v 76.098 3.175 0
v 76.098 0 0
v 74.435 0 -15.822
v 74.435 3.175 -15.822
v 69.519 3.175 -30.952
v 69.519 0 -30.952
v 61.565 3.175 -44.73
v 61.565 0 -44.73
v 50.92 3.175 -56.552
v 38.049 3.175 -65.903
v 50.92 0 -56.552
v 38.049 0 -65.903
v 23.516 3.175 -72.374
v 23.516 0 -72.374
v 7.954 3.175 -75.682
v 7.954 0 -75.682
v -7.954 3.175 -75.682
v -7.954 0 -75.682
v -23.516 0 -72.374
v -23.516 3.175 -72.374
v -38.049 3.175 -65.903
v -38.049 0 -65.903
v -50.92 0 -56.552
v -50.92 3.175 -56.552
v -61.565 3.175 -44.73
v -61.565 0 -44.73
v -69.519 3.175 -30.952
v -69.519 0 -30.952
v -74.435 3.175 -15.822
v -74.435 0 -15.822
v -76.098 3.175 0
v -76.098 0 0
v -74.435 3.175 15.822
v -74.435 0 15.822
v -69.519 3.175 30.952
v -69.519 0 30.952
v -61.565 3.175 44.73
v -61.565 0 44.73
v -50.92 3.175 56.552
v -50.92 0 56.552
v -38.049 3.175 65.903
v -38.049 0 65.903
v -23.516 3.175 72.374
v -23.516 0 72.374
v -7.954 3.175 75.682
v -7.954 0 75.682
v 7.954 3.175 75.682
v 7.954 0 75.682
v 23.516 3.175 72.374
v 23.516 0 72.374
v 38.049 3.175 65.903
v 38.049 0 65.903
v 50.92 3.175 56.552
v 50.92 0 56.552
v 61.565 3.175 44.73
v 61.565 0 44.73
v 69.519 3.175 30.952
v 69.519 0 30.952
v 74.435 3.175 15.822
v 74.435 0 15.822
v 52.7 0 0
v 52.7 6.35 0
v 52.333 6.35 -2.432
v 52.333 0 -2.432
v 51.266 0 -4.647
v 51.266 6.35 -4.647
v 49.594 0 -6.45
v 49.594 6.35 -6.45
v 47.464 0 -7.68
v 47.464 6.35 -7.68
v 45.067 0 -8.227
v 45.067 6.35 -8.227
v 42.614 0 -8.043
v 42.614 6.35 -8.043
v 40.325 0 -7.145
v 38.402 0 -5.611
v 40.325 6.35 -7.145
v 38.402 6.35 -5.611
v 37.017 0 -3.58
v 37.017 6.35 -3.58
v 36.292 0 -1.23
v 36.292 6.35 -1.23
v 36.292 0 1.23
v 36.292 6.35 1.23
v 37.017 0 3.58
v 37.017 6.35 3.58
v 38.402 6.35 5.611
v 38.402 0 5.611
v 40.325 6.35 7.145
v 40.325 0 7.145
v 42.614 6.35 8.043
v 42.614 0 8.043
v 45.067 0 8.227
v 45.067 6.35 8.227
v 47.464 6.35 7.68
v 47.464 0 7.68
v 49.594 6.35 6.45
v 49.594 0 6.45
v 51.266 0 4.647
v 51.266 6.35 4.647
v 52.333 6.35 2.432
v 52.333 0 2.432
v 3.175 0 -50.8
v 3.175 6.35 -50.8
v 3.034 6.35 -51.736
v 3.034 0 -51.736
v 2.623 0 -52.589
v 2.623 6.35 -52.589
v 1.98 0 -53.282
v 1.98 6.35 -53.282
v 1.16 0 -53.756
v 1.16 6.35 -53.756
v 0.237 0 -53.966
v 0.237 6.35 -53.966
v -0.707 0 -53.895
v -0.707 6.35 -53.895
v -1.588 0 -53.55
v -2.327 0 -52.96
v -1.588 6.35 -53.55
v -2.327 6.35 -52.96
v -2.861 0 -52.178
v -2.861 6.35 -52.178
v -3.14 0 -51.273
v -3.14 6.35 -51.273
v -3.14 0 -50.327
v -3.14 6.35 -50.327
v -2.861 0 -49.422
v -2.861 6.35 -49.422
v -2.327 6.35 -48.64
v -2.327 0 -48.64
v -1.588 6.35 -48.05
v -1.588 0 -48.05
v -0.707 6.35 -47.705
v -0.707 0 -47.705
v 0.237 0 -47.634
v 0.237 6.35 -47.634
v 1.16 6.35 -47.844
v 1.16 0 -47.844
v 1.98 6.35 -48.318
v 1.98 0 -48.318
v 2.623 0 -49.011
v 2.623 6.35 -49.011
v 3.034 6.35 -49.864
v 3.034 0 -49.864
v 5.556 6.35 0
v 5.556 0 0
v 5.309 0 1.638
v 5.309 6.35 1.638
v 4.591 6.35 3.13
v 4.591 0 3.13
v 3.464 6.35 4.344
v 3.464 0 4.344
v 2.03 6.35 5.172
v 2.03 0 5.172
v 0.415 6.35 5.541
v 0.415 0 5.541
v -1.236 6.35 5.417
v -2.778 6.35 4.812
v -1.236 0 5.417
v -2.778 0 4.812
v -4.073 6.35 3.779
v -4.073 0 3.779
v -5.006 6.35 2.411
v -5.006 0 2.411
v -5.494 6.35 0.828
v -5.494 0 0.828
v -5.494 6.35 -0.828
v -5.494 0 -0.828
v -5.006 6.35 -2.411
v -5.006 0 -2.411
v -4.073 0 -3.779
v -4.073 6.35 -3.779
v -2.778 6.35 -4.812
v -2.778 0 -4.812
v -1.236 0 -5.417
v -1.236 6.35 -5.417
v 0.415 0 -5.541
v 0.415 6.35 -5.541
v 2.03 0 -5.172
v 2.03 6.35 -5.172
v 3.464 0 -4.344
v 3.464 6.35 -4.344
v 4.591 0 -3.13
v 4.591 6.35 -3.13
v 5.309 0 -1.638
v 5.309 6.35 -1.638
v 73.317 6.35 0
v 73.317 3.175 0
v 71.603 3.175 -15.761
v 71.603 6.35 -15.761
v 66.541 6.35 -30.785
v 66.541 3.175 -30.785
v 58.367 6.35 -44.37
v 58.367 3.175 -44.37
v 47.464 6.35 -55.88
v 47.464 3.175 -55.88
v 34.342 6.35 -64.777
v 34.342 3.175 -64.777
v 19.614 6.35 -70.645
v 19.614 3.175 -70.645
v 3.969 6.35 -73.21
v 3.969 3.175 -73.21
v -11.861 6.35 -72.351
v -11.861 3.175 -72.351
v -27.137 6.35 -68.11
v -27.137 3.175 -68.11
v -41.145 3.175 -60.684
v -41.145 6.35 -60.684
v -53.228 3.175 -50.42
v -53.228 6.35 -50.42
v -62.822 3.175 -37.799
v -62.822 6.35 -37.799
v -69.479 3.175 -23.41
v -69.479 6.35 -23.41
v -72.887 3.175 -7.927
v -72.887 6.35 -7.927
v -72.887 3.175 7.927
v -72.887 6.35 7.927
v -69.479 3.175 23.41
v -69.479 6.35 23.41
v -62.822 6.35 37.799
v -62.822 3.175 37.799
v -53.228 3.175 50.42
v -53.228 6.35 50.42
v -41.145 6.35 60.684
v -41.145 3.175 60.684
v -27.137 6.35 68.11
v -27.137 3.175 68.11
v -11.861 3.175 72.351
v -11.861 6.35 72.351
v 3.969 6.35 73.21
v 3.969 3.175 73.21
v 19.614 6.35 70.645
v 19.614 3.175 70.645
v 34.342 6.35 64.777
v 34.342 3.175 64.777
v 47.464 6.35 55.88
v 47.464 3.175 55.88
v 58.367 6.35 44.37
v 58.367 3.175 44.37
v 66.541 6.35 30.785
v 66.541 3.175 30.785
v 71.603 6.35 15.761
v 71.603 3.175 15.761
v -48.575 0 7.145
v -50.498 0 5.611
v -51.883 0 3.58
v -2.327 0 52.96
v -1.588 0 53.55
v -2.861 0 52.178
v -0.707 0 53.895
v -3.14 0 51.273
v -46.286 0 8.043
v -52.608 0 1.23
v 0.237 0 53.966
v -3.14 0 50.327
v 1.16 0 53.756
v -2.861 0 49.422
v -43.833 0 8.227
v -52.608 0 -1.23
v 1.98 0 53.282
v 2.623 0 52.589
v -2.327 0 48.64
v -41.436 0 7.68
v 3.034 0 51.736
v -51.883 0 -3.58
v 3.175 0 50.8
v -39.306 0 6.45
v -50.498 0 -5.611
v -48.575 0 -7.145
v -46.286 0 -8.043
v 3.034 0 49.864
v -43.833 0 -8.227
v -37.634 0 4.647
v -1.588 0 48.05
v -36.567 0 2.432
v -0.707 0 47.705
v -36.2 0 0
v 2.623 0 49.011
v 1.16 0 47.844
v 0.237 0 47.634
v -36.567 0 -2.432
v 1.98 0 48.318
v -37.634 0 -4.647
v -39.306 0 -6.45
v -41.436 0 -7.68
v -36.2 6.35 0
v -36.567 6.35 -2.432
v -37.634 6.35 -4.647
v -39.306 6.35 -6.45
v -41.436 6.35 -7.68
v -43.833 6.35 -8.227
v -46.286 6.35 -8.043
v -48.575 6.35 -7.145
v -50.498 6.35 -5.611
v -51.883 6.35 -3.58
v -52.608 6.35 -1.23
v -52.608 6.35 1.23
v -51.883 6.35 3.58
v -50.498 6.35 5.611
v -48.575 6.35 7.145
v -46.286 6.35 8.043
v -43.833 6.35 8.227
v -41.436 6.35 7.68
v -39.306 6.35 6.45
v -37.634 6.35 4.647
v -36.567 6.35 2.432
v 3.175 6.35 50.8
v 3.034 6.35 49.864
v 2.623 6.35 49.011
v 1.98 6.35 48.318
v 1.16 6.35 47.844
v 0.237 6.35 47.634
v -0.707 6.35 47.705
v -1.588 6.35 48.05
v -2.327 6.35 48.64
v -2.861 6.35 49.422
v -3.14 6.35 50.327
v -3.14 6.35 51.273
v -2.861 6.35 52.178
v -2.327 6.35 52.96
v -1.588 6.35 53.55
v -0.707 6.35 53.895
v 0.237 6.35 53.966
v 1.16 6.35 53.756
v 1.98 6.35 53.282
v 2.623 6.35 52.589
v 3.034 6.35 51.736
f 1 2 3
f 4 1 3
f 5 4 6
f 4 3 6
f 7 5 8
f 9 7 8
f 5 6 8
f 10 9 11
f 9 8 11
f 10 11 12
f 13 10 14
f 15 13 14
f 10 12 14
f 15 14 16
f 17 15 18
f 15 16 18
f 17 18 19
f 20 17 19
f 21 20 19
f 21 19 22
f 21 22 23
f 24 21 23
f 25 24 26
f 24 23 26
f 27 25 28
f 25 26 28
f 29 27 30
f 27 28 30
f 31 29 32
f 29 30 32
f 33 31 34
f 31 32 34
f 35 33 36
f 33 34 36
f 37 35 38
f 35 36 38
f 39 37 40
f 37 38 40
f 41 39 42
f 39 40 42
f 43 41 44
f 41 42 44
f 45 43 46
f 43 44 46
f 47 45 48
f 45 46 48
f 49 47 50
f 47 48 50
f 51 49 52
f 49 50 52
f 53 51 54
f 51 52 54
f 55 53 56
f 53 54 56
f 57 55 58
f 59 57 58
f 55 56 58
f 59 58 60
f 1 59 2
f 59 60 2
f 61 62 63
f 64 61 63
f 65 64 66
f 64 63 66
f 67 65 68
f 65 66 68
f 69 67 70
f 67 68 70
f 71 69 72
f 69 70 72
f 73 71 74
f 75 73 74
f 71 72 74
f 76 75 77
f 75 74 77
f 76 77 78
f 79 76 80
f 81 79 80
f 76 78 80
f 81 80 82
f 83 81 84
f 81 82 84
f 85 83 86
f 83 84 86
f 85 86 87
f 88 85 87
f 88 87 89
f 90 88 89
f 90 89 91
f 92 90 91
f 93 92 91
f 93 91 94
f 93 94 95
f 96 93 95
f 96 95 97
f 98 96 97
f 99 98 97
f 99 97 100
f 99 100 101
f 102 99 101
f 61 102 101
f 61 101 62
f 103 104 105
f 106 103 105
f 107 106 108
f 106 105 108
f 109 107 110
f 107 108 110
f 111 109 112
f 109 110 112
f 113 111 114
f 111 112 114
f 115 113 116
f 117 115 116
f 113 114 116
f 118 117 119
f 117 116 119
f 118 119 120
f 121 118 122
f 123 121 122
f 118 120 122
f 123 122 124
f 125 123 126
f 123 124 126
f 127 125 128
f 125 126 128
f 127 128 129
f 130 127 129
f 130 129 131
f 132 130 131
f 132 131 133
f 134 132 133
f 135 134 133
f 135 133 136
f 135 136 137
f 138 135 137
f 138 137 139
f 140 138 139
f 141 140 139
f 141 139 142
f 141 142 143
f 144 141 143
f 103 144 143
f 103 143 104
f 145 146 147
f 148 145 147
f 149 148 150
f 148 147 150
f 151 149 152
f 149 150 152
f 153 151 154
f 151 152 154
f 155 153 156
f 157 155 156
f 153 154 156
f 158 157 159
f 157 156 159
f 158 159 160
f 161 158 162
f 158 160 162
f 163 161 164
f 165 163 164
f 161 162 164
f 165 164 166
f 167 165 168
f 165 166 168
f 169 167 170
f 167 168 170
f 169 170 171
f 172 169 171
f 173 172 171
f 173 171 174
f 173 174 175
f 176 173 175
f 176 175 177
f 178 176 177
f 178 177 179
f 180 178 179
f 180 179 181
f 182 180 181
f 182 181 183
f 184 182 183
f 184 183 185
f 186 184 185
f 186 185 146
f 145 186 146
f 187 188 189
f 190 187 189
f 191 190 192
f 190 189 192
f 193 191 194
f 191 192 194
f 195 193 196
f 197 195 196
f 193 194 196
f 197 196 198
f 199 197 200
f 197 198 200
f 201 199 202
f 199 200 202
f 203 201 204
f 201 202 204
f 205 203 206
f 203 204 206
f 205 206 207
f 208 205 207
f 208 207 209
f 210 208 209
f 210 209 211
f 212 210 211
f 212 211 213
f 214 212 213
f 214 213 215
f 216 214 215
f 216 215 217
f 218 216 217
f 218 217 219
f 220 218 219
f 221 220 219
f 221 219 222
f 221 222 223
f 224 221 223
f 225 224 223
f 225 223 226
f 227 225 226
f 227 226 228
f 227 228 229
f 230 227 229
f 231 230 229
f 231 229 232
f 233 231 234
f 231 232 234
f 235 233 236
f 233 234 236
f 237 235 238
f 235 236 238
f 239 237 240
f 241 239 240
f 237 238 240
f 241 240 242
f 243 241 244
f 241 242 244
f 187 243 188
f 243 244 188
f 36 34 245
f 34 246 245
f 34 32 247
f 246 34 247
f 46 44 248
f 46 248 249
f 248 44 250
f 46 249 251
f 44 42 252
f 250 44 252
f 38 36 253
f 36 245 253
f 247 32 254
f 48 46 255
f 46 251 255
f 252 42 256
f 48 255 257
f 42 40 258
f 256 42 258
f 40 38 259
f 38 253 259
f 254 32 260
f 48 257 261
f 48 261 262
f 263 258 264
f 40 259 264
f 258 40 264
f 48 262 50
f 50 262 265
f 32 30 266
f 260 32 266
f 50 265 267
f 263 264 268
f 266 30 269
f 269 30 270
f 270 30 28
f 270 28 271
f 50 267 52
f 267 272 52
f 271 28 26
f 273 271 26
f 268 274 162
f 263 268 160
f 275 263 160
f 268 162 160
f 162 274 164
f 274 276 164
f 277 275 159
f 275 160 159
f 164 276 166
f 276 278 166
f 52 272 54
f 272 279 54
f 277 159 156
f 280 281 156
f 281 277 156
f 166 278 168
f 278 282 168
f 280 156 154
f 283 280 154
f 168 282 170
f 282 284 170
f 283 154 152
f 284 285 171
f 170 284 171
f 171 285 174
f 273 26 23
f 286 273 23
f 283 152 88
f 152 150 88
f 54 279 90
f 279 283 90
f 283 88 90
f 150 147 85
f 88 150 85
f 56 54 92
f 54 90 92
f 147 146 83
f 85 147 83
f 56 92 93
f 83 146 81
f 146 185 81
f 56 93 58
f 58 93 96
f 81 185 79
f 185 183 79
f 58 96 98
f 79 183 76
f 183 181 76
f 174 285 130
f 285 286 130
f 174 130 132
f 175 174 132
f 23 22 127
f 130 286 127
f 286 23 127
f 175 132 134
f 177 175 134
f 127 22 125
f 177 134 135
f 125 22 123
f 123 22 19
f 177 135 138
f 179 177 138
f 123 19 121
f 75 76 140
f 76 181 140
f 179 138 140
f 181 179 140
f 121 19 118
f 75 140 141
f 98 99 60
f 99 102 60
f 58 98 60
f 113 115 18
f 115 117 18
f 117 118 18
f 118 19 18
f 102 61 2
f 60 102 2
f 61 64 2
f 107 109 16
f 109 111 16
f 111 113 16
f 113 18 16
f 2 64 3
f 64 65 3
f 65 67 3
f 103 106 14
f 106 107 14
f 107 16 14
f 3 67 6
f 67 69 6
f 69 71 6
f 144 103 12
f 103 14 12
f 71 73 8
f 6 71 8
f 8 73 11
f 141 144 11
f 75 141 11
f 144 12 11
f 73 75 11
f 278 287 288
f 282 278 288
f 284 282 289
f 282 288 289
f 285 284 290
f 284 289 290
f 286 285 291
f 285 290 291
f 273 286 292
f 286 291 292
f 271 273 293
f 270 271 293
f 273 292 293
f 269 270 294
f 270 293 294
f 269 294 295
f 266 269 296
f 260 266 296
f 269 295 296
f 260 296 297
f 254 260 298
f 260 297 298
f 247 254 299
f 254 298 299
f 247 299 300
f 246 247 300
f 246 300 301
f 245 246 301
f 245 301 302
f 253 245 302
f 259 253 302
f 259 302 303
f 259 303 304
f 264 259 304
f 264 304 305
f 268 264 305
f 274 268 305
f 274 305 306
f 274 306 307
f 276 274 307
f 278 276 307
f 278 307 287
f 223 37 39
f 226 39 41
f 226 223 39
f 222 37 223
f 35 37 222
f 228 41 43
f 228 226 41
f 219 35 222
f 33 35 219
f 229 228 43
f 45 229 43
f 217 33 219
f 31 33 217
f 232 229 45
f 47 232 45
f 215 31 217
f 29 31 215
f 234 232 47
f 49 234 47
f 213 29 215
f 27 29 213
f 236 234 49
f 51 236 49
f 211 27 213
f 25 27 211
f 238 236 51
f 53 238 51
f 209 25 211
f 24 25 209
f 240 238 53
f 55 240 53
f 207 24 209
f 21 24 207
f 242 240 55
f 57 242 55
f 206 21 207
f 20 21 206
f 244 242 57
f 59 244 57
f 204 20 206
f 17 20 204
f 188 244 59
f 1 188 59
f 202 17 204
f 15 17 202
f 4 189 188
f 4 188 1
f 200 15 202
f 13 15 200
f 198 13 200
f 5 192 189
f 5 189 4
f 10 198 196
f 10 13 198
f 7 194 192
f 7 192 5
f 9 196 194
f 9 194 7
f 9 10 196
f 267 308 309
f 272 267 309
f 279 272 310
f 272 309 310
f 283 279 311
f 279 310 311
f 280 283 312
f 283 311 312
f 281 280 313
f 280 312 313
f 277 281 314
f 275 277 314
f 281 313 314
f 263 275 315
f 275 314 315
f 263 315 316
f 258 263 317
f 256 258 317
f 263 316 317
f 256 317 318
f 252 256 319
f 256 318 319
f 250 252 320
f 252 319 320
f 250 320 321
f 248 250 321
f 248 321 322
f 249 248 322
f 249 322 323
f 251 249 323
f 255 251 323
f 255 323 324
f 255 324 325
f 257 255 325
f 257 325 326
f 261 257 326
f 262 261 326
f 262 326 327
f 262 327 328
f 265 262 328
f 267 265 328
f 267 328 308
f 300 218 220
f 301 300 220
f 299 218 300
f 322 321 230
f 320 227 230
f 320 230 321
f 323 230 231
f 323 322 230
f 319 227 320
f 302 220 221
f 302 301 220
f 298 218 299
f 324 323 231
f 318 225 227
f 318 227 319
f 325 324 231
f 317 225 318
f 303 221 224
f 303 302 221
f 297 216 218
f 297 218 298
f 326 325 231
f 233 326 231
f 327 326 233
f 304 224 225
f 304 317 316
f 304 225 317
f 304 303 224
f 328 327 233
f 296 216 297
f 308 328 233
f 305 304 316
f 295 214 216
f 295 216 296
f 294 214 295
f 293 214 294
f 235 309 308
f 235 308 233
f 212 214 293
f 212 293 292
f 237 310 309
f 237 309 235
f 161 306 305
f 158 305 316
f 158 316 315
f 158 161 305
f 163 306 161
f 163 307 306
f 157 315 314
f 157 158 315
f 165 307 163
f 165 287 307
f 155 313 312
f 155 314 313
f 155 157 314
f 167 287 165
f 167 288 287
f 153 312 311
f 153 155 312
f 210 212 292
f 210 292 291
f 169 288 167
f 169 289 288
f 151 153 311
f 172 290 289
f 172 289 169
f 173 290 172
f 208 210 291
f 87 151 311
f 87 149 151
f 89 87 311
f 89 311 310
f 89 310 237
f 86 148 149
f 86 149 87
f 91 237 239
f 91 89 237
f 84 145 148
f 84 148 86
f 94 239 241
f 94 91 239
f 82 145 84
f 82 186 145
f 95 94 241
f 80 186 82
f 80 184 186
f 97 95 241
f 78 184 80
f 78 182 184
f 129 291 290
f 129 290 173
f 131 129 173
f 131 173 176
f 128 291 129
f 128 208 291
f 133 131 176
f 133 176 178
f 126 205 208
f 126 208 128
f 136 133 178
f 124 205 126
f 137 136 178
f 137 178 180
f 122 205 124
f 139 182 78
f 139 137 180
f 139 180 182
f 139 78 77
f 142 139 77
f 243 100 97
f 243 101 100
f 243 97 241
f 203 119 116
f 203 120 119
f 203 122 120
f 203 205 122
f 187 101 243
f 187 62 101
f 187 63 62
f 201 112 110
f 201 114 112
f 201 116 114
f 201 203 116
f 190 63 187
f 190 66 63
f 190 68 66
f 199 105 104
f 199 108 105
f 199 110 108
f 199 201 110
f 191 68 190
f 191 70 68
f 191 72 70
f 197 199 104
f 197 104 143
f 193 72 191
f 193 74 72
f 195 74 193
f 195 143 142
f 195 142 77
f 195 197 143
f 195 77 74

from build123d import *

# Parameters (mm, degrees)
SKETCH1_R                   = 76.0984
BOSS_EXTRUDE1_DEPTH         = 3.175
SKETCH1_3_R                 = 73.3171
BOSS_EXTRUDE2_DEPTH         = 6.35
F_1_4_0_25_DIAMETER_HOLE1_D = 6.35
M18X1_5_TAPPED_HOLE1_D      = 16.5
SKETCH3_3_R                 = 5.55625
CUT_EXTRUDE2_DEPTH          = 108.806565037


with BuildPart() as part:
    # Sketch1 → Boss-Extrude1 (new body)
    with BuildSketch(Plane(origin=(0, 0, 0), x_dir=(1, 0, 0), z_dir=(0, 1, 0))):
        Circle(SKETCH1_R)
    extrude(amount=BOSS_EXTRUDE1_DEPTH)

    # Sketch1<3> → Boss-Extrude2 (add)
    with BuildSketch(Plane(origin=(0, 0, 0), x_dir=(1, 0, 0), z_dir=(0, 1, 0))):
        Circle(SKETCH1_3_R)
    extrude(amount=BOSS_EXTRUDE2_DEPTH)

    # 1/4 (0.25) Diameter Hole1 (through all)
    with Locations(Plane(origin=(0, 0, 0), x_dir=(-1, 0, 0), z_dir=(0, -1, 0))):
        with Locations((0, 50.8), (0, -50.8)):
            Hole(F_1_4_0_25_DIAMETER_HOLE1_D / 2)

    # M18x1.5 Tapped Hole1 (through all)
    with Locations(Plane(origin=(0, 0, 0), x_dir=(-1, 0, 0), z_dir=(0, -1, 0))):
        with Locations((44.45, 0), (-44.45, 0)):
            Hole(M18X1_5_TAPPED_HOLE1_D / 2)

    # Sketch3<3> → Cut-Extrude2 (cut, through all)
    with BuildSketch(Plane.XZ):
        Circle(SKETCH3_3_R)
    extrude(amount=-CUT_EXTRUDE2_DEPTH, mode=Mode.SUBTRACT)


solid = part.part
